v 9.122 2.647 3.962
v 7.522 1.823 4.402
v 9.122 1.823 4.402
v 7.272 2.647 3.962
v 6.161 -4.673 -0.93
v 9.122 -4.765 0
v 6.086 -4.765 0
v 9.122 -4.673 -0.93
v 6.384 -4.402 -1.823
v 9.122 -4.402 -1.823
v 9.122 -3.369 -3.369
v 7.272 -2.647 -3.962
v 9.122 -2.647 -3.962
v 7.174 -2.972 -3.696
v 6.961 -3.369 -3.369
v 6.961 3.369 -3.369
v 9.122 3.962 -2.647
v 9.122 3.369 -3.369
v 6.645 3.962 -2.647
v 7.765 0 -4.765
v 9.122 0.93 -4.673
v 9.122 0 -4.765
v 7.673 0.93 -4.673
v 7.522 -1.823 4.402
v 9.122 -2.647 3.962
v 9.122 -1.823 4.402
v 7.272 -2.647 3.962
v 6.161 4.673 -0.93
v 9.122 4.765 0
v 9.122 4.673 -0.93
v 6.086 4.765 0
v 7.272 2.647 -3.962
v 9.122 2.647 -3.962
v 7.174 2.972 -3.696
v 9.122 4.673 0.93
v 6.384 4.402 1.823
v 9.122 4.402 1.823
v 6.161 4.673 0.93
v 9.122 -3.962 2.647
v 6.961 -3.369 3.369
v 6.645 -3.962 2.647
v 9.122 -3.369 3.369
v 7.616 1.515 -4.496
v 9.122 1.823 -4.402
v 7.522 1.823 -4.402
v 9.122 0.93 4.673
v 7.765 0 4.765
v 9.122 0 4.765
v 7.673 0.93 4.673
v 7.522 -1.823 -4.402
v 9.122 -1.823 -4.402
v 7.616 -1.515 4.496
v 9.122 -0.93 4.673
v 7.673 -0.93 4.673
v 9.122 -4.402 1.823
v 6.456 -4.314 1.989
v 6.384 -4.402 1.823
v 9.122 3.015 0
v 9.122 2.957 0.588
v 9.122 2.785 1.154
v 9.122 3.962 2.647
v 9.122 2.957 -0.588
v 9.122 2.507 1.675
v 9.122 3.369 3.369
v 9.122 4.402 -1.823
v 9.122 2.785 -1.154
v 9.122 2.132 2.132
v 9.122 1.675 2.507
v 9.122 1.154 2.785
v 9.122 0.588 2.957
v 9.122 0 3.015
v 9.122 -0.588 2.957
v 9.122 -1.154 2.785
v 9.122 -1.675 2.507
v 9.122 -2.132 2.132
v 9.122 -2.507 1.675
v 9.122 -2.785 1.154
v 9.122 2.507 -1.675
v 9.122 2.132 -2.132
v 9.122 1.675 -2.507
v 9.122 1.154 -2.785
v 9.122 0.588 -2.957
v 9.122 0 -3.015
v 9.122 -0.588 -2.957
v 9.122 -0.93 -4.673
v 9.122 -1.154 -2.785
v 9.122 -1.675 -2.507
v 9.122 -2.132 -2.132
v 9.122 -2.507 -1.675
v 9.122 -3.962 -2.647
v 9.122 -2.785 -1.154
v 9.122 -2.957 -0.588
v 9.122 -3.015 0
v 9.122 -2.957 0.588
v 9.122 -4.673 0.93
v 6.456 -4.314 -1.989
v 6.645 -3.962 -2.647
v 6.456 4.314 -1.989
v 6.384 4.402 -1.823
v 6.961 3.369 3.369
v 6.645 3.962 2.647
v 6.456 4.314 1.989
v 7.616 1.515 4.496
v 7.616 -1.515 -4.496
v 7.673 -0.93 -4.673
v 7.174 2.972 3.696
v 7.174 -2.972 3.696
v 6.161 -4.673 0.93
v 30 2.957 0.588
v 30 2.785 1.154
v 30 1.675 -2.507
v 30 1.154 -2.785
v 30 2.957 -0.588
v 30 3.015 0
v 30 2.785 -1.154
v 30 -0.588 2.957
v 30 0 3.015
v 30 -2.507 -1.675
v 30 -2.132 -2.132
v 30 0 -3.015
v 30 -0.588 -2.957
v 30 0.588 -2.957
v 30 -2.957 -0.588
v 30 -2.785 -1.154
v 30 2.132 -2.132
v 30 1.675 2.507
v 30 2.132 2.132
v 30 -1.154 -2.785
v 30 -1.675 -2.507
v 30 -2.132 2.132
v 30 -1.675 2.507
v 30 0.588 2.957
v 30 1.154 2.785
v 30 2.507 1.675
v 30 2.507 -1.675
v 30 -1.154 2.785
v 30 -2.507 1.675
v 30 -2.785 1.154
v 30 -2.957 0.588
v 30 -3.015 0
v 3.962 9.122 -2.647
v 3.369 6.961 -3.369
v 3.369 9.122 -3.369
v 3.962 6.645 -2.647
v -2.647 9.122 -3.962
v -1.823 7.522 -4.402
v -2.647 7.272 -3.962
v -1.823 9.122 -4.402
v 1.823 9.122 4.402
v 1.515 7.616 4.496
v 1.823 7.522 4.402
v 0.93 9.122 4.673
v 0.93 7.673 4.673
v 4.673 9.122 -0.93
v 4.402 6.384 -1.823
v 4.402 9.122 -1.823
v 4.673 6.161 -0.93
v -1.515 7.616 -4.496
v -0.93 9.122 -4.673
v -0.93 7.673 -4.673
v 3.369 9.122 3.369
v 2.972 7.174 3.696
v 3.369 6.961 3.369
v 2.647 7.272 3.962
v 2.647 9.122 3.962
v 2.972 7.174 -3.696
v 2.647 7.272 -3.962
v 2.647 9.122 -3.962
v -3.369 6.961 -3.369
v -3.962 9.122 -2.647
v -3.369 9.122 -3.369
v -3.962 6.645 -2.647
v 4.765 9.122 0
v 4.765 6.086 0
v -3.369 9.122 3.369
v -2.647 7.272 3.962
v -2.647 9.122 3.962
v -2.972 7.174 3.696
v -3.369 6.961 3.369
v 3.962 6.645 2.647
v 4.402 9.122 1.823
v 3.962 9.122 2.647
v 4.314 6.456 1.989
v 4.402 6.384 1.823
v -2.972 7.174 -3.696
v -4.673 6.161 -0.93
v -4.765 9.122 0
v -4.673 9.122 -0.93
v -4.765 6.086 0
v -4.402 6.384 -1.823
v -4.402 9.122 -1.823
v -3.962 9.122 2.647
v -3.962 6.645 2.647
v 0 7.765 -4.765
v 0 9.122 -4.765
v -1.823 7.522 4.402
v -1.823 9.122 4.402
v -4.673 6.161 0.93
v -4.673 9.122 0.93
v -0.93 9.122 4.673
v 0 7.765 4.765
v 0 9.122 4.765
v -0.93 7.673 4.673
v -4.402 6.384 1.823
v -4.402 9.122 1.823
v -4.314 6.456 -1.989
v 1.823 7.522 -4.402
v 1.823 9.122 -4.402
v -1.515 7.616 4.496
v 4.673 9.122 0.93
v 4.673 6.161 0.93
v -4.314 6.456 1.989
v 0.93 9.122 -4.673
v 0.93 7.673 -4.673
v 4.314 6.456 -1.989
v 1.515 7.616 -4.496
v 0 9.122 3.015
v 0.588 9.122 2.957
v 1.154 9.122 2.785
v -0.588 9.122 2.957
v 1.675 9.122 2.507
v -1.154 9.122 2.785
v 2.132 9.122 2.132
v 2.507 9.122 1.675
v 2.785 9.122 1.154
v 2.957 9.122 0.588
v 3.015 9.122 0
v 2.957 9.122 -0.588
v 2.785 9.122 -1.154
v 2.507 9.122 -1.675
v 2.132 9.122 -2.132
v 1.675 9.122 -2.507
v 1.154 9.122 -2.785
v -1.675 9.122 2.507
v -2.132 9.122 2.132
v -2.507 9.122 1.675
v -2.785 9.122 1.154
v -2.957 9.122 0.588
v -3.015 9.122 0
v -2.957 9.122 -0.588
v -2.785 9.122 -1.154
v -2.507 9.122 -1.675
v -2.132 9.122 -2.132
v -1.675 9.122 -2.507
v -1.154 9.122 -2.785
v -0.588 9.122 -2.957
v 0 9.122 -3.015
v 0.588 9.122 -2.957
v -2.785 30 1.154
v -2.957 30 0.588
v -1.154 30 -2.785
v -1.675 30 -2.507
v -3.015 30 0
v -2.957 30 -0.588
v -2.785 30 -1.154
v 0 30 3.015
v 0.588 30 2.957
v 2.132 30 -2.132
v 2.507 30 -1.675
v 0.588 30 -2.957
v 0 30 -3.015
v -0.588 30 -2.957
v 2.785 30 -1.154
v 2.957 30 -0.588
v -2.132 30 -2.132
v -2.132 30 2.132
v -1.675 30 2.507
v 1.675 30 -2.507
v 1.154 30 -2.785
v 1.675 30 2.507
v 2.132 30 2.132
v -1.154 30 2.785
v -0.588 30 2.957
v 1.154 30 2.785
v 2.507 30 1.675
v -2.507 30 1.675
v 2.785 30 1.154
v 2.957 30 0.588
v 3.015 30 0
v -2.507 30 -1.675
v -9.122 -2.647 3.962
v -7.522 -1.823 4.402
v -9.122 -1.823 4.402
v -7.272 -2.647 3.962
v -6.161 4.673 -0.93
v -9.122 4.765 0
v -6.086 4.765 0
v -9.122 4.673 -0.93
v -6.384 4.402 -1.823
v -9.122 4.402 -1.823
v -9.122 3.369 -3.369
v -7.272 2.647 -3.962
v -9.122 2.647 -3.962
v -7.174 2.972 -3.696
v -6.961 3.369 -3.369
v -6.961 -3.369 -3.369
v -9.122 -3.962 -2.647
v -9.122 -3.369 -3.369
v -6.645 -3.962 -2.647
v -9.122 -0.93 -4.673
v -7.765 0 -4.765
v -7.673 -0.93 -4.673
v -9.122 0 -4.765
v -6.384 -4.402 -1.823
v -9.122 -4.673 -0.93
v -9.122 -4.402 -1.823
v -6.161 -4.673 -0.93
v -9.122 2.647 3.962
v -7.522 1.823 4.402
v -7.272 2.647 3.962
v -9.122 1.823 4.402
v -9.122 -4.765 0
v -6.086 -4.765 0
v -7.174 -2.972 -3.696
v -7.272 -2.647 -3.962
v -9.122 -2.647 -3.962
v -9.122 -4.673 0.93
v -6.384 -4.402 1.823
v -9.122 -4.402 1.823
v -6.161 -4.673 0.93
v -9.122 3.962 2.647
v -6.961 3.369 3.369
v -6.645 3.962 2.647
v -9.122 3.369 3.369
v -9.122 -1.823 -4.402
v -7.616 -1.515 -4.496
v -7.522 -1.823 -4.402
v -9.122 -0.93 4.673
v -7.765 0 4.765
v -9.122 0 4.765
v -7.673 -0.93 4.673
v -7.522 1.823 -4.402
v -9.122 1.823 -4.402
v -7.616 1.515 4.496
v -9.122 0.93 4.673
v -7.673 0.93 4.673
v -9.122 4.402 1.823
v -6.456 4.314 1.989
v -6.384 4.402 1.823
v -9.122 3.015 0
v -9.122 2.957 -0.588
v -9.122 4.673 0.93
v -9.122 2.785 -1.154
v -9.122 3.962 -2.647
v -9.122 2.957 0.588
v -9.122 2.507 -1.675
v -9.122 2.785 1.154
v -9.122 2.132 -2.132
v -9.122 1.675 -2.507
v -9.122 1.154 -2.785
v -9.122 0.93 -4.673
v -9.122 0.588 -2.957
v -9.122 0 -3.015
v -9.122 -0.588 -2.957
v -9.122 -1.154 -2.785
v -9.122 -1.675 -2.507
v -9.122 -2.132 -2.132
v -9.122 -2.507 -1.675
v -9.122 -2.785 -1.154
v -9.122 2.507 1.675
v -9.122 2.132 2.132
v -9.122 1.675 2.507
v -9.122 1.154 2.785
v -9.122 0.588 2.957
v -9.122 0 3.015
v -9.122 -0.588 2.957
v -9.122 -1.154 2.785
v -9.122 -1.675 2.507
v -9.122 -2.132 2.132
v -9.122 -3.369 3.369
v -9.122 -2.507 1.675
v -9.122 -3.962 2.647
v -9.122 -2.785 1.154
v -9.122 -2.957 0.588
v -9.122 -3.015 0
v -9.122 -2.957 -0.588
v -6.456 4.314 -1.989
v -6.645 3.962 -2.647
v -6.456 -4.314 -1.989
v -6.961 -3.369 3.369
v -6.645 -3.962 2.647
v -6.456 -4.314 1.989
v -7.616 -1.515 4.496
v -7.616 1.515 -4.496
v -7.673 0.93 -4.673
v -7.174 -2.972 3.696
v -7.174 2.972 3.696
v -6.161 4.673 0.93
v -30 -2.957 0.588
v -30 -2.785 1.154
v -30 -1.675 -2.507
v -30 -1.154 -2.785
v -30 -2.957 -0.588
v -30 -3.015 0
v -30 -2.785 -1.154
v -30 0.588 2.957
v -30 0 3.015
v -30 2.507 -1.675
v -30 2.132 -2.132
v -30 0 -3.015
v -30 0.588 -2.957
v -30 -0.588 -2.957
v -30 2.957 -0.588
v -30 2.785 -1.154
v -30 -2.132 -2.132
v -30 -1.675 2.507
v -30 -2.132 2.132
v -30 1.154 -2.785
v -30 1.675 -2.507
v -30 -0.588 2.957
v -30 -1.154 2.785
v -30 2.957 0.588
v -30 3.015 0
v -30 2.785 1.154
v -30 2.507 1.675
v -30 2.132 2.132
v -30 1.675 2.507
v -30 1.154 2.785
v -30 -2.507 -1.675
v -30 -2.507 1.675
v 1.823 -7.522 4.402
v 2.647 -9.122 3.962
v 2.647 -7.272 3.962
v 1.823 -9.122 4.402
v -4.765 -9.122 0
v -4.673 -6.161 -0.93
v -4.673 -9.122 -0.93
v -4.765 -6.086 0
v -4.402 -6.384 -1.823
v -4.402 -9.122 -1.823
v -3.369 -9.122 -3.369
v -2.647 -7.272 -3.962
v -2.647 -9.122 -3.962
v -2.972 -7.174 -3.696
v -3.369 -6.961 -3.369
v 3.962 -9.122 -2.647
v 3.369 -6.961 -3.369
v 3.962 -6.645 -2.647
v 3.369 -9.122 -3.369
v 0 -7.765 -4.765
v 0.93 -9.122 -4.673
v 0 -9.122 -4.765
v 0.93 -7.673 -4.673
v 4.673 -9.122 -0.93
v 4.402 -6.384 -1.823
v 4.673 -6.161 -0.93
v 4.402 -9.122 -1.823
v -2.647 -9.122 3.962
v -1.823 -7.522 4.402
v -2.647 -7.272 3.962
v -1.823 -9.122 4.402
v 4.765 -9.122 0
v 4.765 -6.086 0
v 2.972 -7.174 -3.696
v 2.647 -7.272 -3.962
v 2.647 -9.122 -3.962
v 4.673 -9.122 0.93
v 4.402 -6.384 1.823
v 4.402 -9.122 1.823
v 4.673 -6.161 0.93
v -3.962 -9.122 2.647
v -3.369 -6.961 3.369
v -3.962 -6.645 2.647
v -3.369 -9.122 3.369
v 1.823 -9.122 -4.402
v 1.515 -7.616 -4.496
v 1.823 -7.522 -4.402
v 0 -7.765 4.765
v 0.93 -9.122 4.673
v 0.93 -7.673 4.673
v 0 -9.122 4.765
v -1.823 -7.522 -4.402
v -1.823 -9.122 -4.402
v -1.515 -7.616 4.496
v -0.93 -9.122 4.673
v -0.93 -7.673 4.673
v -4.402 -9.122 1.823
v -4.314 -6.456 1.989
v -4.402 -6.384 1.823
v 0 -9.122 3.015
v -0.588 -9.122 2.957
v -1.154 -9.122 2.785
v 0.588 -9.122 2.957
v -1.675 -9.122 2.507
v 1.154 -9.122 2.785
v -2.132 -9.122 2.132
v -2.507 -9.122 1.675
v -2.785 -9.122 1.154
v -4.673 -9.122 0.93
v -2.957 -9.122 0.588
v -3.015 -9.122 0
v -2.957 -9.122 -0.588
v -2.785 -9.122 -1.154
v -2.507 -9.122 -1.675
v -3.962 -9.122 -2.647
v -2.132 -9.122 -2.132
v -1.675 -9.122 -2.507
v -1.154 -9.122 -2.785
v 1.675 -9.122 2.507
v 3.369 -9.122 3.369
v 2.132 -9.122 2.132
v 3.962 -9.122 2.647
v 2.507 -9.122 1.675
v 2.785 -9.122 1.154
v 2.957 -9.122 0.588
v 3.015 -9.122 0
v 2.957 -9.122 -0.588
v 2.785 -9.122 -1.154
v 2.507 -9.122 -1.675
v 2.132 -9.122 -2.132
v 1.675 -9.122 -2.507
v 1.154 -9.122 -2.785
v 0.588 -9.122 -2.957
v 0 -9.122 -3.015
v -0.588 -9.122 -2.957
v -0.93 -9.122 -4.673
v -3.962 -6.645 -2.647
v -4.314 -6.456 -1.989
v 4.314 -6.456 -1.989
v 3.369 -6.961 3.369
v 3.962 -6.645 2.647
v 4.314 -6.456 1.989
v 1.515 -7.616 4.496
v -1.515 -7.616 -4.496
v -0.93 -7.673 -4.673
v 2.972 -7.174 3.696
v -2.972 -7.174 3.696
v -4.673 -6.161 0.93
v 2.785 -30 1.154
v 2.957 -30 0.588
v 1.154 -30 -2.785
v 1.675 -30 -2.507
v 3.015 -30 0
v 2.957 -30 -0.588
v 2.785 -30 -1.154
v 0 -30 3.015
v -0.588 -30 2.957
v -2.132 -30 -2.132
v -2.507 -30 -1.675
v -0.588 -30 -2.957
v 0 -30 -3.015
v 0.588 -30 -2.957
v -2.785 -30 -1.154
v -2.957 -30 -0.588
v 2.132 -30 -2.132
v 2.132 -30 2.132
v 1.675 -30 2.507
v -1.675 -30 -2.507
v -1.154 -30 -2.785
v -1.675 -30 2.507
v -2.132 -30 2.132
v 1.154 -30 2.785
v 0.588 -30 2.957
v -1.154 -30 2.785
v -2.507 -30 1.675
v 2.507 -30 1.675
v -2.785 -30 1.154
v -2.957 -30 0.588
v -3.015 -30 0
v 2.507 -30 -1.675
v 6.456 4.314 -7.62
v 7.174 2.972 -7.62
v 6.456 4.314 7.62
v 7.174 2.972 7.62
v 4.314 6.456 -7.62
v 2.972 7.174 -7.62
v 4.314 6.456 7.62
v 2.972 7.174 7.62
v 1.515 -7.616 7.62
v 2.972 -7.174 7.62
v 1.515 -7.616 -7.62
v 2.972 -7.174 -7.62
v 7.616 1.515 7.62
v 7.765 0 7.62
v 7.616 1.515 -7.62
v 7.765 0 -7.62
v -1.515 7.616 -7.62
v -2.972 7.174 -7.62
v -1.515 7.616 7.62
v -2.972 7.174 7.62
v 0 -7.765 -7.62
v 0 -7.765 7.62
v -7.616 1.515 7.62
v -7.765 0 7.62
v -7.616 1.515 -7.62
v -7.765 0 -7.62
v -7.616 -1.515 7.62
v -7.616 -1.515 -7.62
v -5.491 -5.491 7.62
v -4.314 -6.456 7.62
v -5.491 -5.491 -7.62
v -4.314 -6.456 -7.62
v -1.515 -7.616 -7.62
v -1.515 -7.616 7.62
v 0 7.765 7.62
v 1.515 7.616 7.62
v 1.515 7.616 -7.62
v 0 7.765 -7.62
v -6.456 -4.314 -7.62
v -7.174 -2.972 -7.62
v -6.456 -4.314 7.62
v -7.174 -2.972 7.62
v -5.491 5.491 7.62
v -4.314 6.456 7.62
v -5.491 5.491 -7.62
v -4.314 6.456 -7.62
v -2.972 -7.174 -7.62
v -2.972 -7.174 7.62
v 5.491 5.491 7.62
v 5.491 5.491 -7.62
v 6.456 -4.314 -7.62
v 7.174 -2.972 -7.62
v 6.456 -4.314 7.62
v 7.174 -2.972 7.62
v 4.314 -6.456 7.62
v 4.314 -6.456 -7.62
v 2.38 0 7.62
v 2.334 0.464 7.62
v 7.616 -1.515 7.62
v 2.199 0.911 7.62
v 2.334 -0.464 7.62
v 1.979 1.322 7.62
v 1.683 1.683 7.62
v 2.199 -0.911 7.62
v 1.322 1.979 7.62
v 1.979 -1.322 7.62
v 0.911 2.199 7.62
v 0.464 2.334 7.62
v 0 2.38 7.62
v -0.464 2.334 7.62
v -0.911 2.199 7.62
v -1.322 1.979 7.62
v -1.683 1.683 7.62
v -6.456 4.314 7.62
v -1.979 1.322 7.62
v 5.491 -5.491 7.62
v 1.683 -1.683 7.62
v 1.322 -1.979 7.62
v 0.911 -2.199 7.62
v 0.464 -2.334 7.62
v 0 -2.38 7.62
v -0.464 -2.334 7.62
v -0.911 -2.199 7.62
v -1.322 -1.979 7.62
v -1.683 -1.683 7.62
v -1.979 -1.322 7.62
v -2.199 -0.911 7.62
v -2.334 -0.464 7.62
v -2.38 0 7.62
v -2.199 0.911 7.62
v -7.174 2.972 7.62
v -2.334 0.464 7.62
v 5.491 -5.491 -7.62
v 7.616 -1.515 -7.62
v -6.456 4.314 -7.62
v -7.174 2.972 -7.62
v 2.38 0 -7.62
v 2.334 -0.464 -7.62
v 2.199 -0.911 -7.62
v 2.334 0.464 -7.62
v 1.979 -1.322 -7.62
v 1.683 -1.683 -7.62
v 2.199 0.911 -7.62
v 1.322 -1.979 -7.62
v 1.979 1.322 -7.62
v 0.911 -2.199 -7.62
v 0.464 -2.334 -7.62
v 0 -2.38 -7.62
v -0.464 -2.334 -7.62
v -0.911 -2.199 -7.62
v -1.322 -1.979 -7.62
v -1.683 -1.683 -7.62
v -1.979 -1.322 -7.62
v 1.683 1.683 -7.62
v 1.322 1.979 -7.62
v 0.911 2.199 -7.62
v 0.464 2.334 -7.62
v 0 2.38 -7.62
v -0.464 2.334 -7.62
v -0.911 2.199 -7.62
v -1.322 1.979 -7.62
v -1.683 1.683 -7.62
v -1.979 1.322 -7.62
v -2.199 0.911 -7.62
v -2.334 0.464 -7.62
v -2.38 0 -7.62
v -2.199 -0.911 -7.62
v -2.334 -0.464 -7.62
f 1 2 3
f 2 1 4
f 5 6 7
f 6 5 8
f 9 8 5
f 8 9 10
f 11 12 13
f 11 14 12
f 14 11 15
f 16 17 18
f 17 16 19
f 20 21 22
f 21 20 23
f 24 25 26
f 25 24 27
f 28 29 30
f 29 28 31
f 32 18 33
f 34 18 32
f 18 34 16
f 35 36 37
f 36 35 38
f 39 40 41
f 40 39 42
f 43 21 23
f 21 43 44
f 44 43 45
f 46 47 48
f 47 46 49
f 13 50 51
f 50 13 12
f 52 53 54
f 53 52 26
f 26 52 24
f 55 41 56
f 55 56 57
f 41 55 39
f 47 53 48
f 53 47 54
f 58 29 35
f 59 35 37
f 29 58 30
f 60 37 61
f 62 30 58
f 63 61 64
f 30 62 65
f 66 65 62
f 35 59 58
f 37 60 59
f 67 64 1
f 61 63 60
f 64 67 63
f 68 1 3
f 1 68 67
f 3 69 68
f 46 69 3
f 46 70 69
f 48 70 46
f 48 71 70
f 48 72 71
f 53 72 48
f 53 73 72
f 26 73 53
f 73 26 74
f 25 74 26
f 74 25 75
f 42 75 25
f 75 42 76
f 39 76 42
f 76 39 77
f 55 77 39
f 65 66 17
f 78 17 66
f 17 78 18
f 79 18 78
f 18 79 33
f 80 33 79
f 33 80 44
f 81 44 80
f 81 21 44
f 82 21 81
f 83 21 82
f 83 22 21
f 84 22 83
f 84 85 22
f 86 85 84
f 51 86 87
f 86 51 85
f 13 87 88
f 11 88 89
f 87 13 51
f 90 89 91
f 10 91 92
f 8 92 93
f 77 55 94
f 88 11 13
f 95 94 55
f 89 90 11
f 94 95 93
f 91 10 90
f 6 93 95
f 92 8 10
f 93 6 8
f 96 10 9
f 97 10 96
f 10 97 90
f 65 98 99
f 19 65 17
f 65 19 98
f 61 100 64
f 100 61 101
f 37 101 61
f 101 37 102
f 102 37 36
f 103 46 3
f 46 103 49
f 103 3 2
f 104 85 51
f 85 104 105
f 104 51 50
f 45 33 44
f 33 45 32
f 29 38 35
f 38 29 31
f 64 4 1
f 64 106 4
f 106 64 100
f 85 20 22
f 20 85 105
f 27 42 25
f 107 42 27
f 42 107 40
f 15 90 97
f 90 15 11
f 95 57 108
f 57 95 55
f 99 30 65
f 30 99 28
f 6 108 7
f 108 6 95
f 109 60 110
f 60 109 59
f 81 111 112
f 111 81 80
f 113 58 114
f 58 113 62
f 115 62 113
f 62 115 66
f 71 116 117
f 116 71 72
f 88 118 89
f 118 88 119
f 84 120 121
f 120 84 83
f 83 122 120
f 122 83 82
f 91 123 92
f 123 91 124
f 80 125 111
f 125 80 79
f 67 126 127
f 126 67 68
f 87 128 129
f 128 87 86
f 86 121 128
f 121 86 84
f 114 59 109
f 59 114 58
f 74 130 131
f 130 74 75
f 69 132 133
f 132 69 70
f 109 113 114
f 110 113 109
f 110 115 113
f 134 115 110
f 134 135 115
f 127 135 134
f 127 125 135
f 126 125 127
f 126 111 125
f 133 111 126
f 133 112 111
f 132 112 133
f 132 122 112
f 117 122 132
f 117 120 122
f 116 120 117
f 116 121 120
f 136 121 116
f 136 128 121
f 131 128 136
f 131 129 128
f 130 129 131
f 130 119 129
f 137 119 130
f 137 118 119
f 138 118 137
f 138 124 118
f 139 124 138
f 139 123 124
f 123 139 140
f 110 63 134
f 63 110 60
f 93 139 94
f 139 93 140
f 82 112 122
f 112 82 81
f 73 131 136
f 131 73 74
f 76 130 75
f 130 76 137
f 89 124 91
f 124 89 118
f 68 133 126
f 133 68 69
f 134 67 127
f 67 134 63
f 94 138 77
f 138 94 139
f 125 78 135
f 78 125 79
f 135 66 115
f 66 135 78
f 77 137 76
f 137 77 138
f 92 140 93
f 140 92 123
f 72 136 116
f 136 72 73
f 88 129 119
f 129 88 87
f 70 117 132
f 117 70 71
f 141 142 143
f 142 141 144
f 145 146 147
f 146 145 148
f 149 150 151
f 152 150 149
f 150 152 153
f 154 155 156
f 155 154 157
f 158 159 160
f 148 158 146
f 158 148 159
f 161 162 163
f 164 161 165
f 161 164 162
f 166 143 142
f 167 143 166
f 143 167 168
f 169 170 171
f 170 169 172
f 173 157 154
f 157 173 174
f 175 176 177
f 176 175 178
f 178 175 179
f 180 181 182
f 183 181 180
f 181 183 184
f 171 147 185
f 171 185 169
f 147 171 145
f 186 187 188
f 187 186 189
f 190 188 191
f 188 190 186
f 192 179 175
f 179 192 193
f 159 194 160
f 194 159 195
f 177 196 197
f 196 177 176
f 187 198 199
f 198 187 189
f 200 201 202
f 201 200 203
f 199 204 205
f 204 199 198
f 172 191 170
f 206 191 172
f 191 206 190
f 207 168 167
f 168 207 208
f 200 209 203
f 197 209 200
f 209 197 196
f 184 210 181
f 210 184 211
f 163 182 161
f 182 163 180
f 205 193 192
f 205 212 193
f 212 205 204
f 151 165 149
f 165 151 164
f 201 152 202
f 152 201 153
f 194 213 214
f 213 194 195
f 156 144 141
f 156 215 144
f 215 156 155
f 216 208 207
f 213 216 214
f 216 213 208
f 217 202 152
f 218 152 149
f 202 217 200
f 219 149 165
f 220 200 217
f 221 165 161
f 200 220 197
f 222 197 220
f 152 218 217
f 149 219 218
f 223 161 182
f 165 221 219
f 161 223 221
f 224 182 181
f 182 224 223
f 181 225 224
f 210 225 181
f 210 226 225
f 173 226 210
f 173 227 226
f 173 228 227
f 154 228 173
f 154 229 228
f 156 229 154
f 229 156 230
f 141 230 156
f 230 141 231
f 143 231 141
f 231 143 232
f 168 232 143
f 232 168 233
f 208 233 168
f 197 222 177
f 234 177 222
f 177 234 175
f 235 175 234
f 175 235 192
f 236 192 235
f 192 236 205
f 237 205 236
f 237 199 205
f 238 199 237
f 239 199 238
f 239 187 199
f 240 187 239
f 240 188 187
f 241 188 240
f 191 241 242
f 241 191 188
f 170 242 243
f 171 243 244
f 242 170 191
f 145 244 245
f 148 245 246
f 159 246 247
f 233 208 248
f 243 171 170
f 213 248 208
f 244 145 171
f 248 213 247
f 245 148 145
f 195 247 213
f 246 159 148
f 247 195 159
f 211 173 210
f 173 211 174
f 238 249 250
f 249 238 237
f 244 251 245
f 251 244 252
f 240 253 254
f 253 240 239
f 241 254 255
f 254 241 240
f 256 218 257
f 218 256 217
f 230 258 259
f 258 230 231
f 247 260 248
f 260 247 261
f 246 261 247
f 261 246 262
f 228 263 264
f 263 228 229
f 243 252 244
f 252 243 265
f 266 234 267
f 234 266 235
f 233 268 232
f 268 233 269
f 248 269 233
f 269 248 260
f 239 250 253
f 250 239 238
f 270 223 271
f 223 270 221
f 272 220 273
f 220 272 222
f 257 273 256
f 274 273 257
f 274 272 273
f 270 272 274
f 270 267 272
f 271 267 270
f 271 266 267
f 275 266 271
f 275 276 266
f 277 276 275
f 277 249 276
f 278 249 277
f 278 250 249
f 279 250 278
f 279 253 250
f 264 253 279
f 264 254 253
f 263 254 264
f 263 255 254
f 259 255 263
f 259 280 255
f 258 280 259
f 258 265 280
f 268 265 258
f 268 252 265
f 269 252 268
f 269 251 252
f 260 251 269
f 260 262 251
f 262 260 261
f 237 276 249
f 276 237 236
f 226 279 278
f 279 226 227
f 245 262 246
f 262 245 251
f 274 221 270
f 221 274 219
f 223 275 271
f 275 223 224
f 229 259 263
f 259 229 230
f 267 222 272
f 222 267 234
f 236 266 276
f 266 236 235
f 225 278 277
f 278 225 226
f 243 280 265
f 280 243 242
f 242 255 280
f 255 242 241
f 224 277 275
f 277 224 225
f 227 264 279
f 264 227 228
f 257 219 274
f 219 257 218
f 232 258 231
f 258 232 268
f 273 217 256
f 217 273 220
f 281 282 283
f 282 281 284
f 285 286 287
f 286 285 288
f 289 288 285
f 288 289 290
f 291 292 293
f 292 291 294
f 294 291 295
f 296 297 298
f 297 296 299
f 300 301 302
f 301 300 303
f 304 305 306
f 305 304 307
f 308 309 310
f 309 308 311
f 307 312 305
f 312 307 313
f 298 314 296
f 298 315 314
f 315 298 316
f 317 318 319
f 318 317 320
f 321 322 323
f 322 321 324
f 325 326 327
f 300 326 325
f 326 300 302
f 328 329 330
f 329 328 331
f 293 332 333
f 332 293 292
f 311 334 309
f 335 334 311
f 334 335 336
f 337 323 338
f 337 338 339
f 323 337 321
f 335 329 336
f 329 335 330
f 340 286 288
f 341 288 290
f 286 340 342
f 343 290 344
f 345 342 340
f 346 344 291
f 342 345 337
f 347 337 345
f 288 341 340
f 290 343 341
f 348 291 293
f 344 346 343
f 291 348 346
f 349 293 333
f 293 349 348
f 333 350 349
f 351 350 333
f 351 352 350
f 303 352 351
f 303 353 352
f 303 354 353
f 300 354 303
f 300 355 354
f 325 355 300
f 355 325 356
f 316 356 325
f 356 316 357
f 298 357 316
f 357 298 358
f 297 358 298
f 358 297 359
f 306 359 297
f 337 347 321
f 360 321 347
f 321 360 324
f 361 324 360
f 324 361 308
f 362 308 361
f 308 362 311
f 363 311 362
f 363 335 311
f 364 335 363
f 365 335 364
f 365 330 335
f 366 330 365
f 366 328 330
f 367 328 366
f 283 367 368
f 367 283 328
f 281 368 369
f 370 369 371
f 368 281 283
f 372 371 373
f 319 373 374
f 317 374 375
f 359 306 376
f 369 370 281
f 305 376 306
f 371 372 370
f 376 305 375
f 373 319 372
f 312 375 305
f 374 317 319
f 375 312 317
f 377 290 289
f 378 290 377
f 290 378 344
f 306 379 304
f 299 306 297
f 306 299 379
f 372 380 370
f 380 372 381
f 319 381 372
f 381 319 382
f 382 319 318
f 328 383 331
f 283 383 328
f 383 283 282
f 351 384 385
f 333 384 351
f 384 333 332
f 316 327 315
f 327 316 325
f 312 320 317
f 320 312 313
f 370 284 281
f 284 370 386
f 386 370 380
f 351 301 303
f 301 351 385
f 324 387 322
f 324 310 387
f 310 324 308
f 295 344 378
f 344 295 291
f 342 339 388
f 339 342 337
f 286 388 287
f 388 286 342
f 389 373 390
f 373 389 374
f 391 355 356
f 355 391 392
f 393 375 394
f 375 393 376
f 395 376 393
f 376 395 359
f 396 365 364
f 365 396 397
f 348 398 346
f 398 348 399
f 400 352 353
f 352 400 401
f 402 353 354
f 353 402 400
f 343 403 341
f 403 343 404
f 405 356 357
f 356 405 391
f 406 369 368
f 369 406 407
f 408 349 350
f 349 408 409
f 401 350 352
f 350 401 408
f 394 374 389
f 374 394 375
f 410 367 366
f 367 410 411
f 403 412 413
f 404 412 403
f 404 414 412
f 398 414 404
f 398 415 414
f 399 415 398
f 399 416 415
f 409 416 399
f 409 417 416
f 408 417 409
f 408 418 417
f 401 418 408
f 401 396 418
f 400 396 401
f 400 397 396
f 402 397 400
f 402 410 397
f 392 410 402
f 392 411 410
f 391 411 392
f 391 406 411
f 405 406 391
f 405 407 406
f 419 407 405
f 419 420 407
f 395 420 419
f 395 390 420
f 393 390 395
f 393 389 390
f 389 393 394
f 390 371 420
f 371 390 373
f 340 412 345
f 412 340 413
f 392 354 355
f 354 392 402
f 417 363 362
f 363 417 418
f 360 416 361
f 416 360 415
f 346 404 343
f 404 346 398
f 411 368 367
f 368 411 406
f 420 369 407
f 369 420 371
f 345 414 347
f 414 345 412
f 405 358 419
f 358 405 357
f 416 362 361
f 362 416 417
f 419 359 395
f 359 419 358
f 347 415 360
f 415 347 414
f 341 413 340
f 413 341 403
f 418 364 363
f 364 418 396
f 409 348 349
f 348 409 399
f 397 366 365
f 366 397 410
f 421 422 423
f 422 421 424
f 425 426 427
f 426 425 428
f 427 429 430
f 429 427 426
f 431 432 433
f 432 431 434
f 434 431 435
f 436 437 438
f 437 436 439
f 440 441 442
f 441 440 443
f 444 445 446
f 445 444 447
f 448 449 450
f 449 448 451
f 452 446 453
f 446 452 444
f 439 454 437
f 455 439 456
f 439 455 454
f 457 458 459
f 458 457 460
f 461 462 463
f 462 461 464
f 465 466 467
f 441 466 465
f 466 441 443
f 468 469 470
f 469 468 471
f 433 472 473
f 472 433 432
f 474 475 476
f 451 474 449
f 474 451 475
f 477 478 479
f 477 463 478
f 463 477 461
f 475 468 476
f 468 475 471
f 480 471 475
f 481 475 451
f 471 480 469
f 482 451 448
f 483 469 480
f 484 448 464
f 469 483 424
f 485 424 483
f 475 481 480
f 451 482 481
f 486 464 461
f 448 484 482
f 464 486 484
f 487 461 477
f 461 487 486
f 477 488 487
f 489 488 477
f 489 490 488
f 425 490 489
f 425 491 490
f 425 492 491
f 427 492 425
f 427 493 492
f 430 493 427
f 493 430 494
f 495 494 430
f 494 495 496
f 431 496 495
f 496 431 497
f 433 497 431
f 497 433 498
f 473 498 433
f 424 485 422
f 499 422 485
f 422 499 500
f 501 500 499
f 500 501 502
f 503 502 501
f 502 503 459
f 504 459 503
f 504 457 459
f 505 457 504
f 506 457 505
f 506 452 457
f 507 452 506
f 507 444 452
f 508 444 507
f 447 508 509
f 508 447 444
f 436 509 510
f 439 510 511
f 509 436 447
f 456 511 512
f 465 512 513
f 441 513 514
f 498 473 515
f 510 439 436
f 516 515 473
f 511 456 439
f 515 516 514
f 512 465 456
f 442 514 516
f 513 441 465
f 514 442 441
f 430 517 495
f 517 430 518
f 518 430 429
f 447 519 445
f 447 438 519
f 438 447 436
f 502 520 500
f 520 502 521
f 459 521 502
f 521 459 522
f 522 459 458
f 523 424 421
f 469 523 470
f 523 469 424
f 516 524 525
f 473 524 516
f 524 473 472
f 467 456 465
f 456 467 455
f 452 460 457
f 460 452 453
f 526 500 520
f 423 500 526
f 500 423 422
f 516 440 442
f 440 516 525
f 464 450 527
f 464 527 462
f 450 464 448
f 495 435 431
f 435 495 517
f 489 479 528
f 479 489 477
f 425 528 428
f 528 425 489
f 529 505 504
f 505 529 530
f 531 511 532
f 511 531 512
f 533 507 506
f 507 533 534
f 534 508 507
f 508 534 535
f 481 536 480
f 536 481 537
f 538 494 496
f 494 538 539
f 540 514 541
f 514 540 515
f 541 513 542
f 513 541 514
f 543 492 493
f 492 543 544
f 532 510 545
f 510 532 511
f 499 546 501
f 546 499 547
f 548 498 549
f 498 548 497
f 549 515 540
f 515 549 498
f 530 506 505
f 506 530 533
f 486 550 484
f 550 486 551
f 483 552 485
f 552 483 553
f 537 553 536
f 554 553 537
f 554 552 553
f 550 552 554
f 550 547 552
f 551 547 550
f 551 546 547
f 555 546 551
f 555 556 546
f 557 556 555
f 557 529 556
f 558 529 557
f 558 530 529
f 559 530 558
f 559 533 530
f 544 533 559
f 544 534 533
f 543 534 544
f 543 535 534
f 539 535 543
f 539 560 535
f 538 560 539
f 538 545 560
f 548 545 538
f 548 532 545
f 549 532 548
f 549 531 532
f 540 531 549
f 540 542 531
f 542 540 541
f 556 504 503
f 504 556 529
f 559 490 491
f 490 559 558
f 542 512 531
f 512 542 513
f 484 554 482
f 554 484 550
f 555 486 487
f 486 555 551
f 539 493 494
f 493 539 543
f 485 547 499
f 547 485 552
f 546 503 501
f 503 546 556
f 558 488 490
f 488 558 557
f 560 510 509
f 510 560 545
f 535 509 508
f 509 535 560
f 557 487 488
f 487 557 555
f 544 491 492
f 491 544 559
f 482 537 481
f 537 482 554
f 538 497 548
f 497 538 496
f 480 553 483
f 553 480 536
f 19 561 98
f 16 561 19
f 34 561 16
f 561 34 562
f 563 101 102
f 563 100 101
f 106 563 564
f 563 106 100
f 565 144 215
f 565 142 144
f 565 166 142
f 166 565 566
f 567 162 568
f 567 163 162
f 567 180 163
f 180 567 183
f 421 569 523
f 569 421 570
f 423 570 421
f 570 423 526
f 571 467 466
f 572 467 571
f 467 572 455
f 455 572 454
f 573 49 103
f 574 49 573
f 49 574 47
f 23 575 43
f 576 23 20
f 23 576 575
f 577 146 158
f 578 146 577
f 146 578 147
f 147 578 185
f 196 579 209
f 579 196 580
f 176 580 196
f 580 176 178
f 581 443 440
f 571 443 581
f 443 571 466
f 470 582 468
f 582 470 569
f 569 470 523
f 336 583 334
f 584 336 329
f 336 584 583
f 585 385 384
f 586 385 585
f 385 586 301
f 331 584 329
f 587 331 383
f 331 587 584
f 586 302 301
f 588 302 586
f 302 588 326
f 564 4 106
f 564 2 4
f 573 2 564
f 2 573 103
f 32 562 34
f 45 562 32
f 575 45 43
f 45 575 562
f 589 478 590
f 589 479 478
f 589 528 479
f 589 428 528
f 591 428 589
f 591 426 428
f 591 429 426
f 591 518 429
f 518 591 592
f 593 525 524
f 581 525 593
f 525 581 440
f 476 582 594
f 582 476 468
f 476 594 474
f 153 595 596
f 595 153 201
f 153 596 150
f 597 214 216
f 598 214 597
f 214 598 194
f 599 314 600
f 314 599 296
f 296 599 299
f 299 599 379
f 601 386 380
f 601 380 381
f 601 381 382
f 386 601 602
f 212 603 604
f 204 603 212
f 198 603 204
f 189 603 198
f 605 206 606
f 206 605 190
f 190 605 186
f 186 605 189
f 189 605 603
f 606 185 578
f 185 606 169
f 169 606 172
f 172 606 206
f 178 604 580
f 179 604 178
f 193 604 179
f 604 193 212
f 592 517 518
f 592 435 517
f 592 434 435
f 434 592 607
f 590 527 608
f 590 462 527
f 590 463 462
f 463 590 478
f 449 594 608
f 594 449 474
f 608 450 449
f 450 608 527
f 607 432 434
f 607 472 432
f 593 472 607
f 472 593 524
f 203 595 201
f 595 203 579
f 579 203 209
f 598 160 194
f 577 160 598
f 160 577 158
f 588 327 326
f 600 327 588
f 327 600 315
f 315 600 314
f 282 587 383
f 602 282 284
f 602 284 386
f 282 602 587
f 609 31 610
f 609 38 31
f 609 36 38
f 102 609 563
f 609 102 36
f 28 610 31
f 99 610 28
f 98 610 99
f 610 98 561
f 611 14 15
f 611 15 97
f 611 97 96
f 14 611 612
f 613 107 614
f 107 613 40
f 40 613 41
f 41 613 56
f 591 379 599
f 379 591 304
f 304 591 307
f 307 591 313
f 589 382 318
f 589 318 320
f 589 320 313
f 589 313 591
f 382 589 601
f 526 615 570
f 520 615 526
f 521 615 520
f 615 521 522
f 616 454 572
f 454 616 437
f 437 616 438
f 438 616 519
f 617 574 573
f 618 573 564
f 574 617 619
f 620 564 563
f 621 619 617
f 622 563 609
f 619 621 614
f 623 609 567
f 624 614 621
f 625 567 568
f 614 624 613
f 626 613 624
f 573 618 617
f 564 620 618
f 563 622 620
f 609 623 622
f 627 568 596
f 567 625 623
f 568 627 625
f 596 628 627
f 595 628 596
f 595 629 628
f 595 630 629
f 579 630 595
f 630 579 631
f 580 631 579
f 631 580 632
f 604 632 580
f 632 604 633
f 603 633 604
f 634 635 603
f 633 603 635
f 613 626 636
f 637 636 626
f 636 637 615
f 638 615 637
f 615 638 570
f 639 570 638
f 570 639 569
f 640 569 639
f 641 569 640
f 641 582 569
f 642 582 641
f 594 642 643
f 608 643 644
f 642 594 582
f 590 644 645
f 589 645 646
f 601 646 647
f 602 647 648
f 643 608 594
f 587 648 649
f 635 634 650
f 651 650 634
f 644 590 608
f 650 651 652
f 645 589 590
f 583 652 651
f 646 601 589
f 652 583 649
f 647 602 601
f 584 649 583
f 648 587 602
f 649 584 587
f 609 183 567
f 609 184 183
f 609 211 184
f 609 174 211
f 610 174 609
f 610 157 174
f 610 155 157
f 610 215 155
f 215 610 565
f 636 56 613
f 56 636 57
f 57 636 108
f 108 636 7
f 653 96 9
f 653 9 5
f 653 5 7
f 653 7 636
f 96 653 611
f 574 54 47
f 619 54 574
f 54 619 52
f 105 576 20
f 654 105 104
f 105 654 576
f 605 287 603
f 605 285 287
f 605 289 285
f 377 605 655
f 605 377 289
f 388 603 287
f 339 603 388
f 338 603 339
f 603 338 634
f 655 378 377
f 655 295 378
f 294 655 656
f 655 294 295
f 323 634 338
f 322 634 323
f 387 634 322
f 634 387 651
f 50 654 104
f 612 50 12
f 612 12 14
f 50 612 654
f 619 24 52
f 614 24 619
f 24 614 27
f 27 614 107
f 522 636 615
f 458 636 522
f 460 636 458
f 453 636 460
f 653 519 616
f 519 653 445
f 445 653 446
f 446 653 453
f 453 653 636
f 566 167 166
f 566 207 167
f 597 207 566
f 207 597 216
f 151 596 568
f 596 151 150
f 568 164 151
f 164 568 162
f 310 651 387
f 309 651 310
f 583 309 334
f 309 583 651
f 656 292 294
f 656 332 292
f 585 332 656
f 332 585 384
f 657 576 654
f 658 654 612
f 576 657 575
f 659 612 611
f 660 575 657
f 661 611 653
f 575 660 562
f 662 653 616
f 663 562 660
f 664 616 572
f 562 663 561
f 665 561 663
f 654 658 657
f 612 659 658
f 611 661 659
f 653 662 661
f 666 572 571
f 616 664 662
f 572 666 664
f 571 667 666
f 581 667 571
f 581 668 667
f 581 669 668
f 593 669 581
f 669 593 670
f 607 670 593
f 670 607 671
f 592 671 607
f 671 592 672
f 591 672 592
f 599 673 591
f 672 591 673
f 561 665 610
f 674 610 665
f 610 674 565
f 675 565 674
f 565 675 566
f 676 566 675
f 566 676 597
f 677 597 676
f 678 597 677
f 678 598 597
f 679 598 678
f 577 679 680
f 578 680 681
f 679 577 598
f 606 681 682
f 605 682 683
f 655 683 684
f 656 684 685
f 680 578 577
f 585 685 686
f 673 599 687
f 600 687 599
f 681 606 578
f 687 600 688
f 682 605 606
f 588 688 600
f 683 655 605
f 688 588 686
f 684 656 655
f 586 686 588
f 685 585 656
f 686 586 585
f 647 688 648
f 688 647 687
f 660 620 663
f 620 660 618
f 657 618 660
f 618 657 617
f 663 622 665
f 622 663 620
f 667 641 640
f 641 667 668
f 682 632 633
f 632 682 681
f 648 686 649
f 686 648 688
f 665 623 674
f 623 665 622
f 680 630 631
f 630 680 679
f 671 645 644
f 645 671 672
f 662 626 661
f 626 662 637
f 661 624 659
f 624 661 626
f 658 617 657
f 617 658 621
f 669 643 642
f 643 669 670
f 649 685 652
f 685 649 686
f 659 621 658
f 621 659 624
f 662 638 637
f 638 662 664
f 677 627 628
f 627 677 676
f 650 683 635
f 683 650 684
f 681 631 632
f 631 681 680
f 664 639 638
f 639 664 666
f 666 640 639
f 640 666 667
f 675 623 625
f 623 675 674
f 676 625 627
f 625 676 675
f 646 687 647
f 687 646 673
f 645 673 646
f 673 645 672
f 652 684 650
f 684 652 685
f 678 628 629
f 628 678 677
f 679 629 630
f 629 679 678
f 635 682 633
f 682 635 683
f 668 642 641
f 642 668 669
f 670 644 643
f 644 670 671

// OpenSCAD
$fn = 32;

// ----------------------------------------------------------------------
// Cardan cross: 60 mm span, 9.53 mm trunnions
// ----------------------------------------------------------------------

// --- parameters (mm) ---
journal_d = 9.53;         // trunnion diameter
arm_len = 30;             // trunnion length from the centre
step_r = 3.24;            // step position from the centre
step_d = 6.03;            // journal diameter after the step
hub_d = 15.53;            // hub diameter
hub_h = 15.24;            // hub height
bore_d = 4.76;            // hub bore

difference() {
  union() {
    /* hub along the joint axis */
    cylinder(h = hub_h, d = hub_d, center = true);
    for (a = [0 : 90 : 270]) rotate([0, 0, a]) {
      /* trunnion, sunk into the hub */
      translate([hub_d / 4, 0, 0]) rotate([0, 90, 0]) cylinder(h = step_r + 2, d = journal_d);
      /* stepped journal out to the tip */
      translate([step_r - 0.5, 0, 0]) rotate([0, 90, 0]) cylinder(h = arm_len + 0.5 - step_r, d = step_d);
    }
  }
  /* lubrication bore through the hub, 2.5 mm clear on both sides */
  translate([0, 0, -hub_h / 2 - 2.5]) cylinder(h = hub_h + 5, d = bore_d);
}
